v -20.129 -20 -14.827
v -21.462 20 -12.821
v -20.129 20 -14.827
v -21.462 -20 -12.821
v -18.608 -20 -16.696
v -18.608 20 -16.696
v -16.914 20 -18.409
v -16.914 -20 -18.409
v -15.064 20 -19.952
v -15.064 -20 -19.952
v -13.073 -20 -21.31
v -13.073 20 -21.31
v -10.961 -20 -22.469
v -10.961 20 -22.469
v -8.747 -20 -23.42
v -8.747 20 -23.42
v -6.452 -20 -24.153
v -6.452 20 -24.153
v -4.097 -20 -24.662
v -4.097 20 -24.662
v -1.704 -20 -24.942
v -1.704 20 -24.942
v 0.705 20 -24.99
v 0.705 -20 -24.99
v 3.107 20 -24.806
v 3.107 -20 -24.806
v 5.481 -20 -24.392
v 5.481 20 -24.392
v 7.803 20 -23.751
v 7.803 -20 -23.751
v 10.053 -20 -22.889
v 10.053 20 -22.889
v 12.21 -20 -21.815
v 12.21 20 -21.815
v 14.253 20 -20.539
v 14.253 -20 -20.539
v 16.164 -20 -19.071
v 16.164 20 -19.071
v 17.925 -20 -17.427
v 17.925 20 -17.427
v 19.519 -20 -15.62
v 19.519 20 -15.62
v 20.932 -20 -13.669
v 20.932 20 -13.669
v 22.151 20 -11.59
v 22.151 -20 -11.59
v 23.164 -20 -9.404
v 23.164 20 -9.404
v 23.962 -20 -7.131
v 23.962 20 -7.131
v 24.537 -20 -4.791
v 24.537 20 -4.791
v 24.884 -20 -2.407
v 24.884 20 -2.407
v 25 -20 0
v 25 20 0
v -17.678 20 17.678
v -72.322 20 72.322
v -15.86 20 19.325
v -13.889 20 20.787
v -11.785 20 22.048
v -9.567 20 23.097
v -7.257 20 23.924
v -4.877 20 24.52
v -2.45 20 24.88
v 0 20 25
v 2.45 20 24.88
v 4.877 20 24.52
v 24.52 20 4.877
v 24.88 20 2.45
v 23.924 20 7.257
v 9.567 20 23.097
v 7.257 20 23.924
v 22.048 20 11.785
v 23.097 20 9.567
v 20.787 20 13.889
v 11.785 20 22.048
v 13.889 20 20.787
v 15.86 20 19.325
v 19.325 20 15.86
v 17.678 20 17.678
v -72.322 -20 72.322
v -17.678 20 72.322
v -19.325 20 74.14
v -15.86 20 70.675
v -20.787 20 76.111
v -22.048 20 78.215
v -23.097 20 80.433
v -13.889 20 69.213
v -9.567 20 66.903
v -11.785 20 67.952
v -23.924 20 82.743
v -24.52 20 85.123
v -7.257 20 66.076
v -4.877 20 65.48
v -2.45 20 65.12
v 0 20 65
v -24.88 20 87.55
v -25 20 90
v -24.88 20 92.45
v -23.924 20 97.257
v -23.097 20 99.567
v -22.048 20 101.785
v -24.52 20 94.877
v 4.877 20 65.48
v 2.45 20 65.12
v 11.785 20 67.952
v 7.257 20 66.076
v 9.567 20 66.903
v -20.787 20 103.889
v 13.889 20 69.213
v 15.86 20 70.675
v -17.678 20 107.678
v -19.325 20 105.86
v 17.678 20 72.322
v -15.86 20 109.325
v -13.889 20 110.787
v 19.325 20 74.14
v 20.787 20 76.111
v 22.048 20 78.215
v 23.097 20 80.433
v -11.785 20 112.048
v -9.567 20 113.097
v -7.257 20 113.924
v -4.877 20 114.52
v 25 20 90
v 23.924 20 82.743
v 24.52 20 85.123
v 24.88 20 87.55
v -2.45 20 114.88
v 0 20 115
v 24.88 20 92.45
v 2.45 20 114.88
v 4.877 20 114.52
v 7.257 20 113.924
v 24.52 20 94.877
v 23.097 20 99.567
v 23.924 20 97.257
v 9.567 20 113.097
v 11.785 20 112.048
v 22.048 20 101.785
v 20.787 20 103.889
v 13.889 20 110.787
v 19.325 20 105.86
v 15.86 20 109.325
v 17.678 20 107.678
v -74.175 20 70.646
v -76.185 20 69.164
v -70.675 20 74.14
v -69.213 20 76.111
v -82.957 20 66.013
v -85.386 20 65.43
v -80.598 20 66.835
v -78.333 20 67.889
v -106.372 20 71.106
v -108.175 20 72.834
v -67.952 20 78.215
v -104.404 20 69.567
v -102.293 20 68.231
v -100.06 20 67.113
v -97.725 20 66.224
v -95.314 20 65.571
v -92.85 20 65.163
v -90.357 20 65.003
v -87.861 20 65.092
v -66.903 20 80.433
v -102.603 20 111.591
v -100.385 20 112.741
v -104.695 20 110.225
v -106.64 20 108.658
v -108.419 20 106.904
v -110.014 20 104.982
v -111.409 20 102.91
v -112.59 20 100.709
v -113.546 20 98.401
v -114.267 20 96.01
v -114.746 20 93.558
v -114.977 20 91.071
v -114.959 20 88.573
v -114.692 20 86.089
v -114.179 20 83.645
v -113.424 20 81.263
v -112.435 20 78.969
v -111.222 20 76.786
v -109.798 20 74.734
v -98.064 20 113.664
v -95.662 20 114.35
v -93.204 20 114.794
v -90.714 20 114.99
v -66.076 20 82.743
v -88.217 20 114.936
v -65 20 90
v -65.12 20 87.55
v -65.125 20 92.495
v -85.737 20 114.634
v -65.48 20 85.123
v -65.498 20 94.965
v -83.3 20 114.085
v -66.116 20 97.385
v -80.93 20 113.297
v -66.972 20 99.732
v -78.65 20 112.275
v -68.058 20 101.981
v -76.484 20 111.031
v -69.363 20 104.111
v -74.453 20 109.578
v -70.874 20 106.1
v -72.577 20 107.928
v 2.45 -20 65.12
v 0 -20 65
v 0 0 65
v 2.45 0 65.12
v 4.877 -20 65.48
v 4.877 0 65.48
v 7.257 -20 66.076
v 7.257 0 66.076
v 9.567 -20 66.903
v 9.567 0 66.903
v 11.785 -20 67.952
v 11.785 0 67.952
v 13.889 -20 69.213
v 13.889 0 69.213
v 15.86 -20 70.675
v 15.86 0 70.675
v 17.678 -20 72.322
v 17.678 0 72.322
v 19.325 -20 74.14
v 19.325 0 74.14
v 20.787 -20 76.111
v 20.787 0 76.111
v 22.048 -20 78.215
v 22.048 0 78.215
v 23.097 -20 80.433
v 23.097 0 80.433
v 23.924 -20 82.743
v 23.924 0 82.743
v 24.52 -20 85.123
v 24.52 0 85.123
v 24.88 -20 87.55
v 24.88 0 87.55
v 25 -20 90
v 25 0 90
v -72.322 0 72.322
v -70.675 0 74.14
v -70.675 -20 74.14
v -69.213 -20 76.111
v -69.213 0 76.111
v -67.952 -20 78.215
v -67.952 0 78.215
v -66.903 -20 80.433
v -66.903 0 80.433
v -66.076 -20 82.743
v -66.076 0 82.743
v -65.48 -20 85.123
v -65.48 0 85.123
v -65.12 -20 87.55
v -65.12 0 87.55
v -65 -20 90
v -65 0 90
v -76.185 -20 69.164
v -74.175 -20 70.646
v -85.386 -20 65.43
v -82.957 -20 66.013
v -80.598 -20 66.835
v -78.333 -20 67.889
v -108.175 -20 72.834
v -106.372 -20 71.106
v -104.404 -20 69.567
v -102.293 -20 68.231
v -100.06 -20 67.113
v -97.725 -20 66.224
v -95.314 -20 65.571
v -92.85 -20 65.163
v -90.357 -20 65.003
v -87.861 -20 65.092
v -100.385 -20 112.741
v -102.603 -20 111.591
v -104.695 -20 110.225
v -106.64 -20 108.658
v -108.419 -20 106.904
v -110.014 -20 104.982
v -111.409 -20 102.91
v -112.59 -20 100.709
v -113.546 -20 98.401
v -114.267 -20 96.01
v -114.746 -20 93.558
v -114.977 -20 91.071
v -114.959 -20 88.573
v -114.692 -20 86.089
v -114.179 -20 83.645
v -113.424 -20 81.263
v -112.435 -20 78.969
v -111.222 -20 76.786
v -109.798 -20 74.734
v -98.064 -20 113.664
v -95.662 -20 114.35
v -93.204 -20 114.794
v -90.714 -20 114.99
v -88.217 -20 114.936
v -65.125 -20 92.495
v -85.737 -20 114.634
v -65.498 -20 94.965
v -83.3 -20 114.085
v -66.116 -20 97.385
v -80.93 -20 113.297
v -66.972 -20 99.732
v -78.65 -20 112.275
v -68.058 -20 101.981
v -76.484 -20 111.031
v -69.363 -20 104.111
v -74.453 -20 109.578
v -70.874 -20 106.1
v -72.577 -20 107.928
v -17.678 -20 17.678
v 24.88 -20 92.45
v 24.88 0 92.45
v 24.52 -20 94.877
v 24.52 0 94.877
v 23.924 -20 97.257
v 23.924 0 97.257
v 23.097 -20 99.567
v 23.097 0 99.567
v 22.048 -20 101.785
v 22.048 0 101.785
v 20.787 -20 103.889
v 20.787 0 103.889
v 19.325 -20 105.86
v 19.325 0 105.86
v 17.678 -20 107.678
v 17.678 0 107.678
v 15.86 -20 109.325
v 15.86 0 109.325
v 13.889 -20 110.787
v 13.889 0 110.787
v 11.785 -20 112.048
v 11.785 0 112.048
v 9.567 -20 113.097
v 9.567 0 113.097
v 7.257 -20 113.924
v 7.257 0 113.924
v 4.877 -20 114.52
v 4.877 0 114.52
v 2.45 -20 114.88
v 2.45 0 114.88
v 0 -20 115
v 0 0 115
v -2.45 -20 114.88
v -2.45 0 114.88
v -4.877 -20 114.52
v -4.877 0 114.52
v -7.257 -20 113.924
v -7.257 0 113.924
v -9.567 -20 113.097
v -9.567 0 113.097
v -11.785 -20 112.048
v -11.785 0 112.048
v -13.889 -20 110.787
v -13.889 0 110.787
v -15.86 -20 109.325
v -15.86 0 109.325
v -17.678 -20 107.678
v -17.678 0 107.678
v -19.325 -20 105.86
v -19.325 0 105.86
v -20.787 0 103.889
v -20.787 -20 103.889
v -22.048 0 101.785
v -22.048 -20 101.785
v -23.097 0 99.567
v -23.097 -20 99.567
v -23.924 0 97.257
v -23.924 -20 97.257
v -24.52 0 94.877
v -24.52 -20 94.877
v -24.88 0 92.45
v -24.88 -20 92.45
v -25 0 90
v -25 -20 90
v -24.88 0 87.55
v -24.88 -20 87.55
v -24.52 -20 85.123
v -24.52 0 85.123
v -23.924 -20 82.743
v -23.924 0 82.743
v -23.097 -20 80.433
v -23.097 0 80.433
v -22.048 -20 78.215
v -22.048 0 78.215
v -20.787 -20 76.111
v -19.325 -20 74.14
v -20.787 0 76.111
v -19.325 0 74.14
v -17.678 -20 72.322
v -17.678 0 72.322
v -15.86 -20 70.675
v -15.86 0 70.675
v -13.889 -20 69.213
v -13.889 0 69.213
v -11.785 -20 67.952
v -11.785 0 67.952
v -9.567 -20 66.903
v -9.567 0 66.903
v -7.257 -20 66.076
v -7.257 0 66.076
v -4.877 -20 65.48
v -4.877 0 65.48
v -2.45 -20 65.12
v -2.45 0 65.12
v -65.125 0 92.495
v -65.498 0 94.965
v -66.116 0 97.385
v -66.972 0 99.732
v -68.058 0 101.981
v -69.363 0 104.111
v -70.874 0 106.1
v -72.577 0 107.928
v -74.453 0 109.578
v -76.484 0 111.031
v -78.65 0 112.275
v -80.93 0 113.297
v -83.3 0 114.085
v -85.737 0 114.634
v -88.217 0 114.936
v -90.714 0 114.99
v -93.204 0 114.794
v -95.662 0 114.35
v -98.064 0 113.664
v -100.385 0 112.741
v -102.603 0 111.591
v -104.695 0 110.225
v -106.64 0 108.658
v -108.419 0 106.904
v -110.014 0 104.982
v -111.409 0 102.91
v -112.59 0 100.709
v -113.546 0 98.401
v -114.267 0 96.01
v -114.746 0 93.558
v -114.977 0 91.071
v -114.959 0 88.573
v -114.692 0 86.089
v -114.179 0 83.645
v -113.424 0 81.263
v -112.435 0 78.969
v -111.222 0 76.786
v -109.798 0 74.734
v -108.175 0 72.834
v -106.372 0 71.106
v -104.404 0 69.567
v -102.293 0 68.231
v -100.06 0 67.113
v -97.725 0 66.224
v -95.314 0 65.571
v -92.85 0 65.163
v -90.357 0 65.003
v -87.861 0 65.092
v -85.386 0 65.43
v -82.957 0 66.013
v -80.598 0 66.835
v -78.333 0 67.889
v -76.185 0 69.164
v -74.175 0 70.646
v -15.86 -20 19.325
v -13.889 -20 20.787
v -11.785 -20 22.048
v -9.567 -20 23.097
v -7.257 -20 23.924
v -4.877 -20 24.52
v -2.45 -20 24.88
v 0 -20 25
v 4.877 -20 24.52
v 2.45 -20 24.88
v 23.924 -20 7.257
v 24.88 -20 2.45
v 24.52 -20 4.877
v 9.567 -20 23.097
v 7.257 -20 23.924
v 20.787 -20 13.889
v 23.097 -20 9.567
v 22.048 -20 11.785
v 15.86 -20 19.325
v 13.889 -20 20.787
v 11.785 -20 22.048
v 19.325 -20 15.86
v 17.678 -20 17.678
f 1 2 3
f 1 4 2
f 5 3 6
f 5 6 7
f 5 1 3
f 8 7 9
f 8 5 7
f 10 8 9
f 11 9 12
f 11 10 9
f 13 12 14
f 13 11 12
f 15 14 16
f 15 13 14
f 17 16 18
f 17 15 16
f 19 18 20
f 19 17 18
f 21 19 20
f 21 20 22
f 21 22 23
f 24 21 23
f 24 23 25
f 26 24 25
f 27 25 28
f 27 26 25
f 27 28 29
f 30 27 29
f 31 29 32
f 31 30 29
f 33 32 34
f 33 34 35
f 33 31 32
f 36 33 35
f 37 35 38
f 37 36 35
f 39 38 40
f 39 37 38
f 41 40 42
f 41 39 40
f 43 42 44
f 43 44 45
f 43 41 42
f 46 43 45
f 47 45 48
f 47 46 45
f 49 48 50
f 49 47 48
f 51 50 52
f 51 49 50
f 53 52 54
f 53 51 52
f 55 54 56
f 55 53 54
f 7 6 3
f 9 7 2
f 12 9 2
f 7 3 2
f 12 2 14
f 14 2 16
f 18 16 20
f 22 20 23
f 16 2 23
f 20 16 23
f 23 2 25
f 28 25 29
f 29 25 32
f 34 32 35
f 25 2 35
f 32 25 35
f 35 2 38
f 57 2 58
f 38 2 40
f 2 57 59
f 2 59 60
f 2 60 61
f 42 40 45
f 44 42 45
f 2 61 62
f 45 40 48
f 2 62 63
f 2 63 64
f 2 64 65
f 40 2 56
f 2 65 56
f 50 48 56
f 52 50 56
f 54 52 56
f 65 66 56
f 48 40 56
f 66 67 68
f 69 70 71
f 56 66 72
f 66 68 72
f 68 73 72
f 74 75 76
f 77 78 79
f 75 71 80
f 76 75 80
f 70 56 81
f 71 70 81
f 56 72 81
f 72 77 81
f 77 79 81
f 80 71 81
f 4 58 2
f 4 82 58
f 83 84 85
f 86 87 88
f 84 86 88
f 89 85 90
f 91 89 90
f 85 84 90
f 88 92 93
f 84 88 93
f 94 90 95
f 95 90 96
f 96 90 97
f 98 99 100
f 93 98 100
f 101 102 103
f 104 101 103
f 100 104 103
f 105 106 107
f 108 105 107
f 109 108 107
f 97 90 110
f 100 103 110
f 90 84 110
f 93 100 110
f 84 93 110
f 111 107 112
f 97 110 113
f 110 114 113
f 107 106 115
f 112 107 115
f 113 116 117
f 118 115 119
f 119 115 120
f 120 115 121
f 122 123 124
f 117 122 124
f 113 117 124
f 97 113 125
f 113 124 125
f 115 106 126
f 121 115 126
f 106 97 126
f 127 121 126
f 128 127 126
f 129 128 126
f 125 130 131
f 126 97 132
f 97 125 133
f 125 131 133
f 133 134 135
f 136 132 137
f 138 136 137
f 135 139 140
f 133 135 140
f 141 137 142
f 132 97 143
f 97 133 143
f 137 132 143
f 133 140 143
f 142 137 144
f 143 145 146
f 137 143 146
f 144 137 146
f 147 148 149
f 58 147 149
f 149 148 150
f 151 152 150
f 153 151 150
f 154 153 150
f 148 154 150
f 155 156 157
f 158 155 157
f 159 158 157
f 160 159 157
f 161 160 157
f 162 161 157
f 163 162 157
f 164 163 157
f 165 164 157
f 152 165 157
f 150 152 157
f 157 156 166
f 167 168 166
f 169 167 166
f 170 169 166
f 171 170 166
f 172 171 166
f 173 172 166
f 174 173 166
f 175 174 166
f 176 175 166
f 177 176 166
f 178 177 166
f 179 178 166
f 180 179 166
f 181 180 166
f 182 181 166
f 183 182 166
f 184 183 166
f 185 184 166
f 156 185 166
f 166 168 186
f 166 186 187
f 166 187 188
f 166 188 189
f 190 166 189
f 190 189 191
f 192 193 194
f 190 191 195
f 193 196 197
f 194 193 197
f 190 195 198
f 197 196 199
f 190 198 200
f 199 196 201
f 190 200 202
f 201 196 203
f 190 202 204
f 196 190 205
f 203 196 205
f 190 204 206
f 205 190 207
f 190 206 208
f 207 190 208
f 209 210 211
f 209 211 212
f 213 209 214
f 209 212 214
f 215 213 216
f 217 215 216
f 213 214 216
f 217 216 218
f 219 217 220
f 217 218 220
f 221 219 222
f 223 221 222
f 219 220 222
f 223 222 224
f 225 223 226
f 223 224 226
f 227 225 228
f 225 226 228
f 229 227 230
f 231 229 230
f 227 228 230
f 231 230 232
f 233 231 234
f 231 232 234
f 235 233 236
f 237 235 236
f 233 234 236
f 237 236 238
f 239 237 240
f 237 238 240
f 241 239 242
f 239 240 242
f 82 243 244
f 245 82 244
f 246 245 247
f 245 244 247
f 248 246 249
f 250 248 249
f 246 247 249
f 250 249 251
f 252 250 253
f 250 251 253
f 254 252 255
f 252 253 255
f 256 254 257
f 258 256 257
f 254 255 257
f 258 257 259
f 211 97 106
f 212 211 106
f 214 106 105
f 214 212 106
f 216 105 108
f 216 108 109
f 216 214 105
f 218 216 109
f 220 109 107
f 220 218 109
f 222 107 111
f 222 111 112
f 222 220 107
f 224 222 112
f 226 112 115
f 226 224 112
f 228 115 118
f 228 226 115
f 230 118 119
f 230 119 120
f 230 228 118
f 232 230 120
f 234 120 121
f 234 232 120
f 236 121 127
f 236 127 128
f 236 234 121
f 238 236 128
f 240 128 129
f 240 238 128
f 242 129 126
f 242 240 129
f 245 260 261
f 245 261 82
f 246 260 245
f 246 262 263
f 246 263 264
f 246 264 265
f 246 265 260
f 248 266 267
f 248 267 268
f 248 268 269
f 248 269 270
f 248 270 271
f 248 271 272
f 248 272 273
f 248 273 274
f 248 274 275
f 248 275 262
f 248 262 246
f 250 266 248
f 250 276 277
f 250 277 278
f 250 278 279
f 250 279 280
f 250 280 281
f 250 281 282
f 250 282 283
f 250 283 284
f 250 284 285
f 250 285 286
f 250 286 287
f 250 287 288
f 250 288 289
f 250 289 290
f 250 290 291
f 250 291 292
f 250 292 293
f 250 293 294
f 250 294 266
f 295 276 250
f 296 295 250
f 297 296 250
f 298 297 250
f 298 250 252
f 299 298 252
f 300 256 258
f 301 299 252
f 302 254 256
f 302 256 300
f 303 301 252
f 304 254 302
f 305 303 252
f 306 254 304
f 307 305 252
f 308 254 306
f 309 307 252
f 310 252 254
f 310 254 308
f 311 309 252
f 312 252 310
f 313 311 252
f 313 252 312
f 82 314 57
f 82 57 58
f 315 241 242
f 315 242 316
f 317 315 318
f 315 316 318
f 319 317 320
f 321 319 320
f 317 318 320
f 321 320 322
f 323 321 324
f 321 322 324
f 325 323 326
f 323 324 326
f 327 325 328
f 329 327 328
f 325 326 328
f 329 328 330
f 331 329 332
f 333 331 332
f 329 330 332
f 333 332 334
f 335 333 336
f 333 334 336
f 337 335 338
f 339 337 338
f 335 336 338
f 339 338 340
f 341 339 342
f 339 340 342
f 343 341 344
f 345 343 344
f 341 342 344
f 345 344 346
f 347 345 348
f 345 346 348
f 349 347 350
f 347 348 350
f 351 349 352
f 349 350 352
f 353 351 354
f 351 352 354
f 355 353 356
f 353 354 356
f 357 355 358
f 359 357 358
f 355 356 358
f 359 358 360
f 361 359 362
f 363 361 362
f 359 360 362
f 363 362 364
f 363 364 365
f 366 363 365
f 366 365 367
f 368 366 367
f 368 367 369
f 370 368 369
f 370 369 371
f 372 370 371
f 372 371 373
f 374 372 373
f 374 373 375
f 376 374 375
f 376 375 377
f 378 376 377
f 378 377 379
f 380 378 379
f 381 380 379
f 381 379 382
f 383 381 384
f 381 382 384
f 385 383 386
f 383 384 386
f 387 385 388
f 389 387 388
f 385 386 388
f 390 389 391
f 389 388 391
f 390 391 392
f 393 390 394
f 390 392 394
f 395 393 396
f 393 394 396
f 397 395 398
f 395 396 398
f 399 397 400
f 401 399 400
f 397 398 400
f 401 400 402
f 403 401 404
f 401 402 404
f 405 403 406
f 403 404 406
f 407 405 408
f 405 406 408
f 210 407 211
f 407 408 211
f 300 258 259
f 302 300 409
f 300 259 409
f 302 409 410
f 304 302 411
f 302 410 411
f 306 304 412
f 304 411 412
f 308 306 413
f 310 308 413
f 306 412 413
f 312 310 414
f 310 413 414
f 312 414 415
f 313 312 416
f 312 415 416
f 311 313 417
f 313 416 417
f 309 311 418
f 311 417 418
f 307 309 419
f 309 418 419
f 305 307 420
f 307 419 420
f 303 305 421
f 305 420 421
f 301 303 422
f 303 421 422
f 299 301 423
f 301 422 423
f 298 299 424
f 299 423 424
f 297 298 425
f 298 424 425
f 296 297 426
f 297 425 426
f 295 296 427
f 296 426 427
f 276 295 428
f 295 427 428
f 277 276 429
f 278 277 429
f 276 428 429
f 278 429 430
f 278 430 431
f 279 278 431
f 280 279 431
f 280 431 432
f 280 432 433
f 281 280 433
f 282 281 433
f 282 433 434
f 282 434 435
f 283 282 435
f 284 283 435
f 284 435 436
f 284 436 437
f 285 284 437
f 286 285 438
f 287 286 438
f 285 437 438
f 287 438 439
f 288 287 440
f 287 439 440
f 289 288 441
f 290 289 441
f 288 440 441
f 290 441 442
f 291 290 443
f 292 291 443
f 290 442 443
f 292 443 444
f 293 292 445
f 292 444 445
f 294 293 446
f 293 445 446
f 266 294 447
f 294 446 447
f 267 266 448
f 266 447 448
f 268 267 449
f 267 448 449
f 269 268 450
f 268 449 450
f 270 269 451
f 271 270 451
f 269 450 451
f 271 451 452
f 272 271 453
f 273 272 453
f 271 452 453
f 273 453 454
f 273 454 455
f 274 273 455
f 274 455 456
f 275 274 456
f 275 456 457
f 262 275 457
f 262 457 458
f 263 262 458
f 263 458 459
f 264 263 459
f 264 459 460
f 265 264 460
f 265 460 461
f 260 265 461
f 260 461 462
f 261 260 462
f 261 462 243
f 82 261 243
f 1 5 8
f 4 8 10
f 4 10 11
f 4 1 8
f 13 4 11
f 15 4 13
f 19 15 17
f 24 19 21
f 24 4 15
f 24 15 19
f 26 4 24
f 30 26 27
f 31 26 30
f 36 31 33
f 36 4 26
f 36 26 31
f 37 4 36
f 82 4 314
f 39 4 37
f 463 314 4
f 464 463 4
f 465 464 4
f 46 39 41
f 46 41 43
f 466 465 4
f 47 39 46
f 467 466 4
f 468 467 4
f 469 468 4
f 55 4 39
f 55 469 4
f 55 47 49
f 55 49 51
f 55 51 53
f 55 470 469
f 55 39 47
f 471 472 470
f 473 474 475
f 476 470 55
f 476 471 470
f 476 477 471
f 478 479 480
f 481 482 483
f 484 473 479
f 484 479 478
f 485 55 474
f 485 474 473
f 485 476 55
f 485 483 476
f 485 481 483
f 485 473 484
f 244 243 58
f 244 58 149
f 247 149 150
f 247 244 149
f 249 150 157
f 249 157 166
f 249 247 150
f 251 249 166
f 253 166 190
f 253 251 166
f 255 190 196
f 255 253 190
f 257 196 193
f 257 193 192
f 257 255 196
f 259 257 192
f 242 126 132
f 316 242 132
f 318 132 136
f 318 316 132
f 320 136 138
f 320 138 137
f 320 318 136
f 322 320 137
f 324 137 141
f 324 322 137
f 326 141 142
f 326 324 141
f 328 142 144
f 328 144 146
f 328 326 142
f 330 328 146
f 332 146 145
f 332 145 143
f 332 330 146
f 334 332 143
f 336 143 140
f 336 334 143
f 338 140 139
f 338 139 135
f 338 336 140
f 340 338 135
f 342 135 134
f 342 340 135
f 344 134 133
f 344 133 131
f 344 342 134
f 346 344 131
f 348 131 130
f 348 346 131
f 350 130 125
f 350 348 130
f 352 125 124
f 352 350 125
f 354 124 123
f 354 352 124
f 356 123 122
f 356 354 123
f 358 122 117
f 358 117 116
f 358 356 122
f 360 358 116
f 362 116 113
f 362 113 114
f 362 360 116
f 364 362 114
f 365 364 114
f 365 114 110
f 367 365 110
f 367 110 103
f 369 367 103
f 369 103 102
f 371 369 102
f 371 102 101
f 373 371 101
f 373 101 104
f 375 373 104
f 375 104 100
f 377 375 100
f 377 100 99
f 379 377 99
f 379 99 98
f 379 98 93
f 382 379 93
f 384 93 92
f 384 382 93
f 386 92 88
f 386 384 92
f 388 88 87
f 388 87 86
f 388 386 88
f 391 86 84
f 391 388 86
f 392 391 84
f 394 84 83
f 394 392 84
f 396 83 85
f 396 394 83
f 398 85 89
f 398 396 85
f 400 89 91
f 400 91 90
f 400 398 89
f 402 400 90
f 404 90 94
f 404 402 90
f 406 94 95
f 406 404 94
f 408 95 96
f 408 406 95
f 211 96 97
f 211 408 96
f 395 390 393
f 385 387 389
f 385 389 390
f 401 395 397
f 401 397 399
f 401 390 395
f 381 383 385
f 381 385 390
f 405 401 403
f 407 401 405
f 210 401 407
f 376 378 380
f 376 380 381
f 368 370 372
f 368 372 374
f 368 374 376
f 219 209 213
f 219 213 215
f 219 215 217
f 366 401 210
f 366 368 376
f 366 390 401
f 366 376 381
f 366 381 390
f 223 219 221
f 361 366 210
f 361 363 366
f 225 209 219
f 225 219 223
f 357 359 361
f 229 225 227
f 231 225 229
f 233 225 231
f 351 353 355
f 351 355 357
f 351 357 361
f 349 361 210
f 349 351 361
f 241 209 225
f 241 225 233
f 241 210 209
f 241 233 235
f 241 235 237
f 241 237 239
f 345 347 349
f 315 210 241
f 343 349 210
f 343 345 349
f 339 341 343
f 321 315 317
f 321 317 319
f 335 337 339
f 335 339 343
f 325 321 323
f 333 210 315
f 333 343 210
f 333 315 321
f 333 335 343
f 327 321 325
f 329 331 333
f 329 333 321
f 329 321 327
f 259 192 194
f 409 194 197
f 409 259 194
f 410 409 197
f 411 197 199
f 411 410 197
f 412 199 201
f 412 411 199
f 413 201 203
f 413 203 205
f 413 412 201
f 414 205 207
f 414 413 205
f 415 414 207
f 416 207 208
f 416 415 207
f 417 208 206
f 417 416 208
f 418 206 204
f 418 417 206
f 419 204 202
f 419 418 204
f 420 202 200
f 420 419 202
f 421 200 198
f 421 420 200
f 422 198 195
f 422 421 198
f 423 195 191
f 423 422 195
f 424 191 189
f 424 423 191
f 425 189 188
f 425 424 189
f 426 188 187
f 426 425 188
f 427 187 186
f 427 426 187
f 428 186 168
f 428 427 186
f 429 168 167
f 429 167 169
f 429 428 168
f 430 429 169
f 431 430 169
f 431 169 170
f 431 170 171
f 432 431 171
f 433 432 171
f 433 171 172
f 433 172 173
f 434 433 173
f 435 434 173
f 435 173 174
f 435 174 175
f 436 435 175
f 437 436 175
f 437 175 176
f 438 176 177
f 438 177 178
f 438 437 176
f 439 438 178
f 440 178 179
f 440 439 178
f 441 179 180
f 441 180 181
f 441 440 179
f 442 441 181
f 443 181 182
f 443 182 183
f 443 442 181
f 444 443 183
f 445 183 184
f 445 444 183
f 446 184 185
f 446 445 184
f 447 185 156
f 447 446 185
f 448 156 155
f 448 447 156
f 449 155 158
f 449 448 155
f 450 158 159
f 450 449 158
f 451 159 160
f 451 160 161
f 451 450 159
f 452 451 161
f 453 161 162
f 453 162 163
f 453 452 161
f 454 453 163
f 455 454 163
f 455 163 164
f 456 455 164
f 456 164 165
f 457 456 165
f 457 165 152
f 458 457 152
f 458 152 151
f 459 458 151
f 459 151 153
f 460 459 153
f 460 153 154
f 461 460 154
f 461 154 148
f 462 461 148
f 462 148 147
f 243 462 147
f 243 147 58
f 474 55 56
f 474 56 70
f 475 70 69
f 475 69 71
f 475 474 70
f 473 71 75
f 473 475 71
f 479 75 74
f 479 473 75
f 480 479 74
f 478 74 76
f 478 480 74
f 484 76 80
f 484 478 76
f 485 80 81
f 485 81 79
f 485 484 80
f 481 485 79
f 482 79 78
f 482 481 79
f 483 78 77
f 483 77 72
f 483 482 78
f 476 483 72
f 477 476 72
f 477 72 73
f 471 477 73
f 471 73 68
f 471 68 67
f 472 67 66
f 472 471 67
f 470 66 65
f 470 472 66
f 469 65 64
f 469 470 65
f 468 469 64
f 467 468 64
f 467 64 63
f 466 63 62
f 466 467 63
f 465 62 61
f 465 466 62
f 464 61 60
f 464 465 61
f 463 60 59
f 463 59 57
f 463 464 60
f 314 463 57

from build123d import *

# Parameters (mm, degrees)
F1_DEPTH = 20


with BuildPart() as f1:
    # F0 (on Front) → F1 (new body, symmetric)
    with BuildSketch(Plane.XZ):
        with BuildLine():
            ThreePointArc((-17.6776695297, 17.6776695297), (-24.8096957555, 3.0787979016), (-21.4623902815, -12.820522743))
            ThreePointArc((-21.4623902815, -12.820522743), (6.6498211616, -24.0993750649), (25, 0))
            ThreePointArc((25, 0), (17.6776695297, 17.6776695297), (0, 25))
            Line((0, 25), (0, 0))
            Line((0, 0), (-17.6776695297, 17.6776695297))
        make_face()
        with BuildLine():
            Line((-72.3223304703, 72.3223304703), (-21.4623902815, -12.820522743))
            ThreePointArc((-21.4623902815, -12.820522743), (-24.8096957555, 3.0787979016), (-17.6776695297, 17.6776695297))
            Line((-17.6776695297, 17.6776695297), (-72.3223304703, 72.3223304703))
        make_face()
        with BuildLine():
            ThreePointArc((0, 25), (-9.5670858091, 23.0969883128), (-17.6776695297, 17.6776695297))
            Line((-17.6776695297, 17.6776695297), (0, 0))
            Line((0, 0), (0, 25))
        make_face()
    extrude(amount=F1_DEPTH, both=True)


with BuildPart() as f1b:
    # F0 (on Front) → F1, piece 2 (new body, symmetric)
    with BuildSketch(Plane.XZ):
        with BuildLine():
            ThreePointArc((-65, 90), (-113.0969883128, 99.5670858091), (-72.3223304703, 72.3223304703))
            ThreePointArc((-72.3223304703, 72.3223304703), (-66.9030116872, 80.4329141909), (-65, 90))
        make_face()
    extrude(amount=F1_DEPTH, both=True)


with BuildPart() as f1c:
    # F0 (on Front) → F1, piece 3 (new body, symmetric)
    with BuildSketch(Plane.XZ):
        with BuildLine():
            ThreePointArc((25, 90), (-17.6776695297, 107.6776695297), (0, 65))
            ThreePointArc((0, 65), (17.6776695297, 72.3223304703), (25, 90))
        make_face()
    extrude(amount=F1_DEPTH, both=True)


solid = Compound([f1.part, f1b.part, f1c.part])
